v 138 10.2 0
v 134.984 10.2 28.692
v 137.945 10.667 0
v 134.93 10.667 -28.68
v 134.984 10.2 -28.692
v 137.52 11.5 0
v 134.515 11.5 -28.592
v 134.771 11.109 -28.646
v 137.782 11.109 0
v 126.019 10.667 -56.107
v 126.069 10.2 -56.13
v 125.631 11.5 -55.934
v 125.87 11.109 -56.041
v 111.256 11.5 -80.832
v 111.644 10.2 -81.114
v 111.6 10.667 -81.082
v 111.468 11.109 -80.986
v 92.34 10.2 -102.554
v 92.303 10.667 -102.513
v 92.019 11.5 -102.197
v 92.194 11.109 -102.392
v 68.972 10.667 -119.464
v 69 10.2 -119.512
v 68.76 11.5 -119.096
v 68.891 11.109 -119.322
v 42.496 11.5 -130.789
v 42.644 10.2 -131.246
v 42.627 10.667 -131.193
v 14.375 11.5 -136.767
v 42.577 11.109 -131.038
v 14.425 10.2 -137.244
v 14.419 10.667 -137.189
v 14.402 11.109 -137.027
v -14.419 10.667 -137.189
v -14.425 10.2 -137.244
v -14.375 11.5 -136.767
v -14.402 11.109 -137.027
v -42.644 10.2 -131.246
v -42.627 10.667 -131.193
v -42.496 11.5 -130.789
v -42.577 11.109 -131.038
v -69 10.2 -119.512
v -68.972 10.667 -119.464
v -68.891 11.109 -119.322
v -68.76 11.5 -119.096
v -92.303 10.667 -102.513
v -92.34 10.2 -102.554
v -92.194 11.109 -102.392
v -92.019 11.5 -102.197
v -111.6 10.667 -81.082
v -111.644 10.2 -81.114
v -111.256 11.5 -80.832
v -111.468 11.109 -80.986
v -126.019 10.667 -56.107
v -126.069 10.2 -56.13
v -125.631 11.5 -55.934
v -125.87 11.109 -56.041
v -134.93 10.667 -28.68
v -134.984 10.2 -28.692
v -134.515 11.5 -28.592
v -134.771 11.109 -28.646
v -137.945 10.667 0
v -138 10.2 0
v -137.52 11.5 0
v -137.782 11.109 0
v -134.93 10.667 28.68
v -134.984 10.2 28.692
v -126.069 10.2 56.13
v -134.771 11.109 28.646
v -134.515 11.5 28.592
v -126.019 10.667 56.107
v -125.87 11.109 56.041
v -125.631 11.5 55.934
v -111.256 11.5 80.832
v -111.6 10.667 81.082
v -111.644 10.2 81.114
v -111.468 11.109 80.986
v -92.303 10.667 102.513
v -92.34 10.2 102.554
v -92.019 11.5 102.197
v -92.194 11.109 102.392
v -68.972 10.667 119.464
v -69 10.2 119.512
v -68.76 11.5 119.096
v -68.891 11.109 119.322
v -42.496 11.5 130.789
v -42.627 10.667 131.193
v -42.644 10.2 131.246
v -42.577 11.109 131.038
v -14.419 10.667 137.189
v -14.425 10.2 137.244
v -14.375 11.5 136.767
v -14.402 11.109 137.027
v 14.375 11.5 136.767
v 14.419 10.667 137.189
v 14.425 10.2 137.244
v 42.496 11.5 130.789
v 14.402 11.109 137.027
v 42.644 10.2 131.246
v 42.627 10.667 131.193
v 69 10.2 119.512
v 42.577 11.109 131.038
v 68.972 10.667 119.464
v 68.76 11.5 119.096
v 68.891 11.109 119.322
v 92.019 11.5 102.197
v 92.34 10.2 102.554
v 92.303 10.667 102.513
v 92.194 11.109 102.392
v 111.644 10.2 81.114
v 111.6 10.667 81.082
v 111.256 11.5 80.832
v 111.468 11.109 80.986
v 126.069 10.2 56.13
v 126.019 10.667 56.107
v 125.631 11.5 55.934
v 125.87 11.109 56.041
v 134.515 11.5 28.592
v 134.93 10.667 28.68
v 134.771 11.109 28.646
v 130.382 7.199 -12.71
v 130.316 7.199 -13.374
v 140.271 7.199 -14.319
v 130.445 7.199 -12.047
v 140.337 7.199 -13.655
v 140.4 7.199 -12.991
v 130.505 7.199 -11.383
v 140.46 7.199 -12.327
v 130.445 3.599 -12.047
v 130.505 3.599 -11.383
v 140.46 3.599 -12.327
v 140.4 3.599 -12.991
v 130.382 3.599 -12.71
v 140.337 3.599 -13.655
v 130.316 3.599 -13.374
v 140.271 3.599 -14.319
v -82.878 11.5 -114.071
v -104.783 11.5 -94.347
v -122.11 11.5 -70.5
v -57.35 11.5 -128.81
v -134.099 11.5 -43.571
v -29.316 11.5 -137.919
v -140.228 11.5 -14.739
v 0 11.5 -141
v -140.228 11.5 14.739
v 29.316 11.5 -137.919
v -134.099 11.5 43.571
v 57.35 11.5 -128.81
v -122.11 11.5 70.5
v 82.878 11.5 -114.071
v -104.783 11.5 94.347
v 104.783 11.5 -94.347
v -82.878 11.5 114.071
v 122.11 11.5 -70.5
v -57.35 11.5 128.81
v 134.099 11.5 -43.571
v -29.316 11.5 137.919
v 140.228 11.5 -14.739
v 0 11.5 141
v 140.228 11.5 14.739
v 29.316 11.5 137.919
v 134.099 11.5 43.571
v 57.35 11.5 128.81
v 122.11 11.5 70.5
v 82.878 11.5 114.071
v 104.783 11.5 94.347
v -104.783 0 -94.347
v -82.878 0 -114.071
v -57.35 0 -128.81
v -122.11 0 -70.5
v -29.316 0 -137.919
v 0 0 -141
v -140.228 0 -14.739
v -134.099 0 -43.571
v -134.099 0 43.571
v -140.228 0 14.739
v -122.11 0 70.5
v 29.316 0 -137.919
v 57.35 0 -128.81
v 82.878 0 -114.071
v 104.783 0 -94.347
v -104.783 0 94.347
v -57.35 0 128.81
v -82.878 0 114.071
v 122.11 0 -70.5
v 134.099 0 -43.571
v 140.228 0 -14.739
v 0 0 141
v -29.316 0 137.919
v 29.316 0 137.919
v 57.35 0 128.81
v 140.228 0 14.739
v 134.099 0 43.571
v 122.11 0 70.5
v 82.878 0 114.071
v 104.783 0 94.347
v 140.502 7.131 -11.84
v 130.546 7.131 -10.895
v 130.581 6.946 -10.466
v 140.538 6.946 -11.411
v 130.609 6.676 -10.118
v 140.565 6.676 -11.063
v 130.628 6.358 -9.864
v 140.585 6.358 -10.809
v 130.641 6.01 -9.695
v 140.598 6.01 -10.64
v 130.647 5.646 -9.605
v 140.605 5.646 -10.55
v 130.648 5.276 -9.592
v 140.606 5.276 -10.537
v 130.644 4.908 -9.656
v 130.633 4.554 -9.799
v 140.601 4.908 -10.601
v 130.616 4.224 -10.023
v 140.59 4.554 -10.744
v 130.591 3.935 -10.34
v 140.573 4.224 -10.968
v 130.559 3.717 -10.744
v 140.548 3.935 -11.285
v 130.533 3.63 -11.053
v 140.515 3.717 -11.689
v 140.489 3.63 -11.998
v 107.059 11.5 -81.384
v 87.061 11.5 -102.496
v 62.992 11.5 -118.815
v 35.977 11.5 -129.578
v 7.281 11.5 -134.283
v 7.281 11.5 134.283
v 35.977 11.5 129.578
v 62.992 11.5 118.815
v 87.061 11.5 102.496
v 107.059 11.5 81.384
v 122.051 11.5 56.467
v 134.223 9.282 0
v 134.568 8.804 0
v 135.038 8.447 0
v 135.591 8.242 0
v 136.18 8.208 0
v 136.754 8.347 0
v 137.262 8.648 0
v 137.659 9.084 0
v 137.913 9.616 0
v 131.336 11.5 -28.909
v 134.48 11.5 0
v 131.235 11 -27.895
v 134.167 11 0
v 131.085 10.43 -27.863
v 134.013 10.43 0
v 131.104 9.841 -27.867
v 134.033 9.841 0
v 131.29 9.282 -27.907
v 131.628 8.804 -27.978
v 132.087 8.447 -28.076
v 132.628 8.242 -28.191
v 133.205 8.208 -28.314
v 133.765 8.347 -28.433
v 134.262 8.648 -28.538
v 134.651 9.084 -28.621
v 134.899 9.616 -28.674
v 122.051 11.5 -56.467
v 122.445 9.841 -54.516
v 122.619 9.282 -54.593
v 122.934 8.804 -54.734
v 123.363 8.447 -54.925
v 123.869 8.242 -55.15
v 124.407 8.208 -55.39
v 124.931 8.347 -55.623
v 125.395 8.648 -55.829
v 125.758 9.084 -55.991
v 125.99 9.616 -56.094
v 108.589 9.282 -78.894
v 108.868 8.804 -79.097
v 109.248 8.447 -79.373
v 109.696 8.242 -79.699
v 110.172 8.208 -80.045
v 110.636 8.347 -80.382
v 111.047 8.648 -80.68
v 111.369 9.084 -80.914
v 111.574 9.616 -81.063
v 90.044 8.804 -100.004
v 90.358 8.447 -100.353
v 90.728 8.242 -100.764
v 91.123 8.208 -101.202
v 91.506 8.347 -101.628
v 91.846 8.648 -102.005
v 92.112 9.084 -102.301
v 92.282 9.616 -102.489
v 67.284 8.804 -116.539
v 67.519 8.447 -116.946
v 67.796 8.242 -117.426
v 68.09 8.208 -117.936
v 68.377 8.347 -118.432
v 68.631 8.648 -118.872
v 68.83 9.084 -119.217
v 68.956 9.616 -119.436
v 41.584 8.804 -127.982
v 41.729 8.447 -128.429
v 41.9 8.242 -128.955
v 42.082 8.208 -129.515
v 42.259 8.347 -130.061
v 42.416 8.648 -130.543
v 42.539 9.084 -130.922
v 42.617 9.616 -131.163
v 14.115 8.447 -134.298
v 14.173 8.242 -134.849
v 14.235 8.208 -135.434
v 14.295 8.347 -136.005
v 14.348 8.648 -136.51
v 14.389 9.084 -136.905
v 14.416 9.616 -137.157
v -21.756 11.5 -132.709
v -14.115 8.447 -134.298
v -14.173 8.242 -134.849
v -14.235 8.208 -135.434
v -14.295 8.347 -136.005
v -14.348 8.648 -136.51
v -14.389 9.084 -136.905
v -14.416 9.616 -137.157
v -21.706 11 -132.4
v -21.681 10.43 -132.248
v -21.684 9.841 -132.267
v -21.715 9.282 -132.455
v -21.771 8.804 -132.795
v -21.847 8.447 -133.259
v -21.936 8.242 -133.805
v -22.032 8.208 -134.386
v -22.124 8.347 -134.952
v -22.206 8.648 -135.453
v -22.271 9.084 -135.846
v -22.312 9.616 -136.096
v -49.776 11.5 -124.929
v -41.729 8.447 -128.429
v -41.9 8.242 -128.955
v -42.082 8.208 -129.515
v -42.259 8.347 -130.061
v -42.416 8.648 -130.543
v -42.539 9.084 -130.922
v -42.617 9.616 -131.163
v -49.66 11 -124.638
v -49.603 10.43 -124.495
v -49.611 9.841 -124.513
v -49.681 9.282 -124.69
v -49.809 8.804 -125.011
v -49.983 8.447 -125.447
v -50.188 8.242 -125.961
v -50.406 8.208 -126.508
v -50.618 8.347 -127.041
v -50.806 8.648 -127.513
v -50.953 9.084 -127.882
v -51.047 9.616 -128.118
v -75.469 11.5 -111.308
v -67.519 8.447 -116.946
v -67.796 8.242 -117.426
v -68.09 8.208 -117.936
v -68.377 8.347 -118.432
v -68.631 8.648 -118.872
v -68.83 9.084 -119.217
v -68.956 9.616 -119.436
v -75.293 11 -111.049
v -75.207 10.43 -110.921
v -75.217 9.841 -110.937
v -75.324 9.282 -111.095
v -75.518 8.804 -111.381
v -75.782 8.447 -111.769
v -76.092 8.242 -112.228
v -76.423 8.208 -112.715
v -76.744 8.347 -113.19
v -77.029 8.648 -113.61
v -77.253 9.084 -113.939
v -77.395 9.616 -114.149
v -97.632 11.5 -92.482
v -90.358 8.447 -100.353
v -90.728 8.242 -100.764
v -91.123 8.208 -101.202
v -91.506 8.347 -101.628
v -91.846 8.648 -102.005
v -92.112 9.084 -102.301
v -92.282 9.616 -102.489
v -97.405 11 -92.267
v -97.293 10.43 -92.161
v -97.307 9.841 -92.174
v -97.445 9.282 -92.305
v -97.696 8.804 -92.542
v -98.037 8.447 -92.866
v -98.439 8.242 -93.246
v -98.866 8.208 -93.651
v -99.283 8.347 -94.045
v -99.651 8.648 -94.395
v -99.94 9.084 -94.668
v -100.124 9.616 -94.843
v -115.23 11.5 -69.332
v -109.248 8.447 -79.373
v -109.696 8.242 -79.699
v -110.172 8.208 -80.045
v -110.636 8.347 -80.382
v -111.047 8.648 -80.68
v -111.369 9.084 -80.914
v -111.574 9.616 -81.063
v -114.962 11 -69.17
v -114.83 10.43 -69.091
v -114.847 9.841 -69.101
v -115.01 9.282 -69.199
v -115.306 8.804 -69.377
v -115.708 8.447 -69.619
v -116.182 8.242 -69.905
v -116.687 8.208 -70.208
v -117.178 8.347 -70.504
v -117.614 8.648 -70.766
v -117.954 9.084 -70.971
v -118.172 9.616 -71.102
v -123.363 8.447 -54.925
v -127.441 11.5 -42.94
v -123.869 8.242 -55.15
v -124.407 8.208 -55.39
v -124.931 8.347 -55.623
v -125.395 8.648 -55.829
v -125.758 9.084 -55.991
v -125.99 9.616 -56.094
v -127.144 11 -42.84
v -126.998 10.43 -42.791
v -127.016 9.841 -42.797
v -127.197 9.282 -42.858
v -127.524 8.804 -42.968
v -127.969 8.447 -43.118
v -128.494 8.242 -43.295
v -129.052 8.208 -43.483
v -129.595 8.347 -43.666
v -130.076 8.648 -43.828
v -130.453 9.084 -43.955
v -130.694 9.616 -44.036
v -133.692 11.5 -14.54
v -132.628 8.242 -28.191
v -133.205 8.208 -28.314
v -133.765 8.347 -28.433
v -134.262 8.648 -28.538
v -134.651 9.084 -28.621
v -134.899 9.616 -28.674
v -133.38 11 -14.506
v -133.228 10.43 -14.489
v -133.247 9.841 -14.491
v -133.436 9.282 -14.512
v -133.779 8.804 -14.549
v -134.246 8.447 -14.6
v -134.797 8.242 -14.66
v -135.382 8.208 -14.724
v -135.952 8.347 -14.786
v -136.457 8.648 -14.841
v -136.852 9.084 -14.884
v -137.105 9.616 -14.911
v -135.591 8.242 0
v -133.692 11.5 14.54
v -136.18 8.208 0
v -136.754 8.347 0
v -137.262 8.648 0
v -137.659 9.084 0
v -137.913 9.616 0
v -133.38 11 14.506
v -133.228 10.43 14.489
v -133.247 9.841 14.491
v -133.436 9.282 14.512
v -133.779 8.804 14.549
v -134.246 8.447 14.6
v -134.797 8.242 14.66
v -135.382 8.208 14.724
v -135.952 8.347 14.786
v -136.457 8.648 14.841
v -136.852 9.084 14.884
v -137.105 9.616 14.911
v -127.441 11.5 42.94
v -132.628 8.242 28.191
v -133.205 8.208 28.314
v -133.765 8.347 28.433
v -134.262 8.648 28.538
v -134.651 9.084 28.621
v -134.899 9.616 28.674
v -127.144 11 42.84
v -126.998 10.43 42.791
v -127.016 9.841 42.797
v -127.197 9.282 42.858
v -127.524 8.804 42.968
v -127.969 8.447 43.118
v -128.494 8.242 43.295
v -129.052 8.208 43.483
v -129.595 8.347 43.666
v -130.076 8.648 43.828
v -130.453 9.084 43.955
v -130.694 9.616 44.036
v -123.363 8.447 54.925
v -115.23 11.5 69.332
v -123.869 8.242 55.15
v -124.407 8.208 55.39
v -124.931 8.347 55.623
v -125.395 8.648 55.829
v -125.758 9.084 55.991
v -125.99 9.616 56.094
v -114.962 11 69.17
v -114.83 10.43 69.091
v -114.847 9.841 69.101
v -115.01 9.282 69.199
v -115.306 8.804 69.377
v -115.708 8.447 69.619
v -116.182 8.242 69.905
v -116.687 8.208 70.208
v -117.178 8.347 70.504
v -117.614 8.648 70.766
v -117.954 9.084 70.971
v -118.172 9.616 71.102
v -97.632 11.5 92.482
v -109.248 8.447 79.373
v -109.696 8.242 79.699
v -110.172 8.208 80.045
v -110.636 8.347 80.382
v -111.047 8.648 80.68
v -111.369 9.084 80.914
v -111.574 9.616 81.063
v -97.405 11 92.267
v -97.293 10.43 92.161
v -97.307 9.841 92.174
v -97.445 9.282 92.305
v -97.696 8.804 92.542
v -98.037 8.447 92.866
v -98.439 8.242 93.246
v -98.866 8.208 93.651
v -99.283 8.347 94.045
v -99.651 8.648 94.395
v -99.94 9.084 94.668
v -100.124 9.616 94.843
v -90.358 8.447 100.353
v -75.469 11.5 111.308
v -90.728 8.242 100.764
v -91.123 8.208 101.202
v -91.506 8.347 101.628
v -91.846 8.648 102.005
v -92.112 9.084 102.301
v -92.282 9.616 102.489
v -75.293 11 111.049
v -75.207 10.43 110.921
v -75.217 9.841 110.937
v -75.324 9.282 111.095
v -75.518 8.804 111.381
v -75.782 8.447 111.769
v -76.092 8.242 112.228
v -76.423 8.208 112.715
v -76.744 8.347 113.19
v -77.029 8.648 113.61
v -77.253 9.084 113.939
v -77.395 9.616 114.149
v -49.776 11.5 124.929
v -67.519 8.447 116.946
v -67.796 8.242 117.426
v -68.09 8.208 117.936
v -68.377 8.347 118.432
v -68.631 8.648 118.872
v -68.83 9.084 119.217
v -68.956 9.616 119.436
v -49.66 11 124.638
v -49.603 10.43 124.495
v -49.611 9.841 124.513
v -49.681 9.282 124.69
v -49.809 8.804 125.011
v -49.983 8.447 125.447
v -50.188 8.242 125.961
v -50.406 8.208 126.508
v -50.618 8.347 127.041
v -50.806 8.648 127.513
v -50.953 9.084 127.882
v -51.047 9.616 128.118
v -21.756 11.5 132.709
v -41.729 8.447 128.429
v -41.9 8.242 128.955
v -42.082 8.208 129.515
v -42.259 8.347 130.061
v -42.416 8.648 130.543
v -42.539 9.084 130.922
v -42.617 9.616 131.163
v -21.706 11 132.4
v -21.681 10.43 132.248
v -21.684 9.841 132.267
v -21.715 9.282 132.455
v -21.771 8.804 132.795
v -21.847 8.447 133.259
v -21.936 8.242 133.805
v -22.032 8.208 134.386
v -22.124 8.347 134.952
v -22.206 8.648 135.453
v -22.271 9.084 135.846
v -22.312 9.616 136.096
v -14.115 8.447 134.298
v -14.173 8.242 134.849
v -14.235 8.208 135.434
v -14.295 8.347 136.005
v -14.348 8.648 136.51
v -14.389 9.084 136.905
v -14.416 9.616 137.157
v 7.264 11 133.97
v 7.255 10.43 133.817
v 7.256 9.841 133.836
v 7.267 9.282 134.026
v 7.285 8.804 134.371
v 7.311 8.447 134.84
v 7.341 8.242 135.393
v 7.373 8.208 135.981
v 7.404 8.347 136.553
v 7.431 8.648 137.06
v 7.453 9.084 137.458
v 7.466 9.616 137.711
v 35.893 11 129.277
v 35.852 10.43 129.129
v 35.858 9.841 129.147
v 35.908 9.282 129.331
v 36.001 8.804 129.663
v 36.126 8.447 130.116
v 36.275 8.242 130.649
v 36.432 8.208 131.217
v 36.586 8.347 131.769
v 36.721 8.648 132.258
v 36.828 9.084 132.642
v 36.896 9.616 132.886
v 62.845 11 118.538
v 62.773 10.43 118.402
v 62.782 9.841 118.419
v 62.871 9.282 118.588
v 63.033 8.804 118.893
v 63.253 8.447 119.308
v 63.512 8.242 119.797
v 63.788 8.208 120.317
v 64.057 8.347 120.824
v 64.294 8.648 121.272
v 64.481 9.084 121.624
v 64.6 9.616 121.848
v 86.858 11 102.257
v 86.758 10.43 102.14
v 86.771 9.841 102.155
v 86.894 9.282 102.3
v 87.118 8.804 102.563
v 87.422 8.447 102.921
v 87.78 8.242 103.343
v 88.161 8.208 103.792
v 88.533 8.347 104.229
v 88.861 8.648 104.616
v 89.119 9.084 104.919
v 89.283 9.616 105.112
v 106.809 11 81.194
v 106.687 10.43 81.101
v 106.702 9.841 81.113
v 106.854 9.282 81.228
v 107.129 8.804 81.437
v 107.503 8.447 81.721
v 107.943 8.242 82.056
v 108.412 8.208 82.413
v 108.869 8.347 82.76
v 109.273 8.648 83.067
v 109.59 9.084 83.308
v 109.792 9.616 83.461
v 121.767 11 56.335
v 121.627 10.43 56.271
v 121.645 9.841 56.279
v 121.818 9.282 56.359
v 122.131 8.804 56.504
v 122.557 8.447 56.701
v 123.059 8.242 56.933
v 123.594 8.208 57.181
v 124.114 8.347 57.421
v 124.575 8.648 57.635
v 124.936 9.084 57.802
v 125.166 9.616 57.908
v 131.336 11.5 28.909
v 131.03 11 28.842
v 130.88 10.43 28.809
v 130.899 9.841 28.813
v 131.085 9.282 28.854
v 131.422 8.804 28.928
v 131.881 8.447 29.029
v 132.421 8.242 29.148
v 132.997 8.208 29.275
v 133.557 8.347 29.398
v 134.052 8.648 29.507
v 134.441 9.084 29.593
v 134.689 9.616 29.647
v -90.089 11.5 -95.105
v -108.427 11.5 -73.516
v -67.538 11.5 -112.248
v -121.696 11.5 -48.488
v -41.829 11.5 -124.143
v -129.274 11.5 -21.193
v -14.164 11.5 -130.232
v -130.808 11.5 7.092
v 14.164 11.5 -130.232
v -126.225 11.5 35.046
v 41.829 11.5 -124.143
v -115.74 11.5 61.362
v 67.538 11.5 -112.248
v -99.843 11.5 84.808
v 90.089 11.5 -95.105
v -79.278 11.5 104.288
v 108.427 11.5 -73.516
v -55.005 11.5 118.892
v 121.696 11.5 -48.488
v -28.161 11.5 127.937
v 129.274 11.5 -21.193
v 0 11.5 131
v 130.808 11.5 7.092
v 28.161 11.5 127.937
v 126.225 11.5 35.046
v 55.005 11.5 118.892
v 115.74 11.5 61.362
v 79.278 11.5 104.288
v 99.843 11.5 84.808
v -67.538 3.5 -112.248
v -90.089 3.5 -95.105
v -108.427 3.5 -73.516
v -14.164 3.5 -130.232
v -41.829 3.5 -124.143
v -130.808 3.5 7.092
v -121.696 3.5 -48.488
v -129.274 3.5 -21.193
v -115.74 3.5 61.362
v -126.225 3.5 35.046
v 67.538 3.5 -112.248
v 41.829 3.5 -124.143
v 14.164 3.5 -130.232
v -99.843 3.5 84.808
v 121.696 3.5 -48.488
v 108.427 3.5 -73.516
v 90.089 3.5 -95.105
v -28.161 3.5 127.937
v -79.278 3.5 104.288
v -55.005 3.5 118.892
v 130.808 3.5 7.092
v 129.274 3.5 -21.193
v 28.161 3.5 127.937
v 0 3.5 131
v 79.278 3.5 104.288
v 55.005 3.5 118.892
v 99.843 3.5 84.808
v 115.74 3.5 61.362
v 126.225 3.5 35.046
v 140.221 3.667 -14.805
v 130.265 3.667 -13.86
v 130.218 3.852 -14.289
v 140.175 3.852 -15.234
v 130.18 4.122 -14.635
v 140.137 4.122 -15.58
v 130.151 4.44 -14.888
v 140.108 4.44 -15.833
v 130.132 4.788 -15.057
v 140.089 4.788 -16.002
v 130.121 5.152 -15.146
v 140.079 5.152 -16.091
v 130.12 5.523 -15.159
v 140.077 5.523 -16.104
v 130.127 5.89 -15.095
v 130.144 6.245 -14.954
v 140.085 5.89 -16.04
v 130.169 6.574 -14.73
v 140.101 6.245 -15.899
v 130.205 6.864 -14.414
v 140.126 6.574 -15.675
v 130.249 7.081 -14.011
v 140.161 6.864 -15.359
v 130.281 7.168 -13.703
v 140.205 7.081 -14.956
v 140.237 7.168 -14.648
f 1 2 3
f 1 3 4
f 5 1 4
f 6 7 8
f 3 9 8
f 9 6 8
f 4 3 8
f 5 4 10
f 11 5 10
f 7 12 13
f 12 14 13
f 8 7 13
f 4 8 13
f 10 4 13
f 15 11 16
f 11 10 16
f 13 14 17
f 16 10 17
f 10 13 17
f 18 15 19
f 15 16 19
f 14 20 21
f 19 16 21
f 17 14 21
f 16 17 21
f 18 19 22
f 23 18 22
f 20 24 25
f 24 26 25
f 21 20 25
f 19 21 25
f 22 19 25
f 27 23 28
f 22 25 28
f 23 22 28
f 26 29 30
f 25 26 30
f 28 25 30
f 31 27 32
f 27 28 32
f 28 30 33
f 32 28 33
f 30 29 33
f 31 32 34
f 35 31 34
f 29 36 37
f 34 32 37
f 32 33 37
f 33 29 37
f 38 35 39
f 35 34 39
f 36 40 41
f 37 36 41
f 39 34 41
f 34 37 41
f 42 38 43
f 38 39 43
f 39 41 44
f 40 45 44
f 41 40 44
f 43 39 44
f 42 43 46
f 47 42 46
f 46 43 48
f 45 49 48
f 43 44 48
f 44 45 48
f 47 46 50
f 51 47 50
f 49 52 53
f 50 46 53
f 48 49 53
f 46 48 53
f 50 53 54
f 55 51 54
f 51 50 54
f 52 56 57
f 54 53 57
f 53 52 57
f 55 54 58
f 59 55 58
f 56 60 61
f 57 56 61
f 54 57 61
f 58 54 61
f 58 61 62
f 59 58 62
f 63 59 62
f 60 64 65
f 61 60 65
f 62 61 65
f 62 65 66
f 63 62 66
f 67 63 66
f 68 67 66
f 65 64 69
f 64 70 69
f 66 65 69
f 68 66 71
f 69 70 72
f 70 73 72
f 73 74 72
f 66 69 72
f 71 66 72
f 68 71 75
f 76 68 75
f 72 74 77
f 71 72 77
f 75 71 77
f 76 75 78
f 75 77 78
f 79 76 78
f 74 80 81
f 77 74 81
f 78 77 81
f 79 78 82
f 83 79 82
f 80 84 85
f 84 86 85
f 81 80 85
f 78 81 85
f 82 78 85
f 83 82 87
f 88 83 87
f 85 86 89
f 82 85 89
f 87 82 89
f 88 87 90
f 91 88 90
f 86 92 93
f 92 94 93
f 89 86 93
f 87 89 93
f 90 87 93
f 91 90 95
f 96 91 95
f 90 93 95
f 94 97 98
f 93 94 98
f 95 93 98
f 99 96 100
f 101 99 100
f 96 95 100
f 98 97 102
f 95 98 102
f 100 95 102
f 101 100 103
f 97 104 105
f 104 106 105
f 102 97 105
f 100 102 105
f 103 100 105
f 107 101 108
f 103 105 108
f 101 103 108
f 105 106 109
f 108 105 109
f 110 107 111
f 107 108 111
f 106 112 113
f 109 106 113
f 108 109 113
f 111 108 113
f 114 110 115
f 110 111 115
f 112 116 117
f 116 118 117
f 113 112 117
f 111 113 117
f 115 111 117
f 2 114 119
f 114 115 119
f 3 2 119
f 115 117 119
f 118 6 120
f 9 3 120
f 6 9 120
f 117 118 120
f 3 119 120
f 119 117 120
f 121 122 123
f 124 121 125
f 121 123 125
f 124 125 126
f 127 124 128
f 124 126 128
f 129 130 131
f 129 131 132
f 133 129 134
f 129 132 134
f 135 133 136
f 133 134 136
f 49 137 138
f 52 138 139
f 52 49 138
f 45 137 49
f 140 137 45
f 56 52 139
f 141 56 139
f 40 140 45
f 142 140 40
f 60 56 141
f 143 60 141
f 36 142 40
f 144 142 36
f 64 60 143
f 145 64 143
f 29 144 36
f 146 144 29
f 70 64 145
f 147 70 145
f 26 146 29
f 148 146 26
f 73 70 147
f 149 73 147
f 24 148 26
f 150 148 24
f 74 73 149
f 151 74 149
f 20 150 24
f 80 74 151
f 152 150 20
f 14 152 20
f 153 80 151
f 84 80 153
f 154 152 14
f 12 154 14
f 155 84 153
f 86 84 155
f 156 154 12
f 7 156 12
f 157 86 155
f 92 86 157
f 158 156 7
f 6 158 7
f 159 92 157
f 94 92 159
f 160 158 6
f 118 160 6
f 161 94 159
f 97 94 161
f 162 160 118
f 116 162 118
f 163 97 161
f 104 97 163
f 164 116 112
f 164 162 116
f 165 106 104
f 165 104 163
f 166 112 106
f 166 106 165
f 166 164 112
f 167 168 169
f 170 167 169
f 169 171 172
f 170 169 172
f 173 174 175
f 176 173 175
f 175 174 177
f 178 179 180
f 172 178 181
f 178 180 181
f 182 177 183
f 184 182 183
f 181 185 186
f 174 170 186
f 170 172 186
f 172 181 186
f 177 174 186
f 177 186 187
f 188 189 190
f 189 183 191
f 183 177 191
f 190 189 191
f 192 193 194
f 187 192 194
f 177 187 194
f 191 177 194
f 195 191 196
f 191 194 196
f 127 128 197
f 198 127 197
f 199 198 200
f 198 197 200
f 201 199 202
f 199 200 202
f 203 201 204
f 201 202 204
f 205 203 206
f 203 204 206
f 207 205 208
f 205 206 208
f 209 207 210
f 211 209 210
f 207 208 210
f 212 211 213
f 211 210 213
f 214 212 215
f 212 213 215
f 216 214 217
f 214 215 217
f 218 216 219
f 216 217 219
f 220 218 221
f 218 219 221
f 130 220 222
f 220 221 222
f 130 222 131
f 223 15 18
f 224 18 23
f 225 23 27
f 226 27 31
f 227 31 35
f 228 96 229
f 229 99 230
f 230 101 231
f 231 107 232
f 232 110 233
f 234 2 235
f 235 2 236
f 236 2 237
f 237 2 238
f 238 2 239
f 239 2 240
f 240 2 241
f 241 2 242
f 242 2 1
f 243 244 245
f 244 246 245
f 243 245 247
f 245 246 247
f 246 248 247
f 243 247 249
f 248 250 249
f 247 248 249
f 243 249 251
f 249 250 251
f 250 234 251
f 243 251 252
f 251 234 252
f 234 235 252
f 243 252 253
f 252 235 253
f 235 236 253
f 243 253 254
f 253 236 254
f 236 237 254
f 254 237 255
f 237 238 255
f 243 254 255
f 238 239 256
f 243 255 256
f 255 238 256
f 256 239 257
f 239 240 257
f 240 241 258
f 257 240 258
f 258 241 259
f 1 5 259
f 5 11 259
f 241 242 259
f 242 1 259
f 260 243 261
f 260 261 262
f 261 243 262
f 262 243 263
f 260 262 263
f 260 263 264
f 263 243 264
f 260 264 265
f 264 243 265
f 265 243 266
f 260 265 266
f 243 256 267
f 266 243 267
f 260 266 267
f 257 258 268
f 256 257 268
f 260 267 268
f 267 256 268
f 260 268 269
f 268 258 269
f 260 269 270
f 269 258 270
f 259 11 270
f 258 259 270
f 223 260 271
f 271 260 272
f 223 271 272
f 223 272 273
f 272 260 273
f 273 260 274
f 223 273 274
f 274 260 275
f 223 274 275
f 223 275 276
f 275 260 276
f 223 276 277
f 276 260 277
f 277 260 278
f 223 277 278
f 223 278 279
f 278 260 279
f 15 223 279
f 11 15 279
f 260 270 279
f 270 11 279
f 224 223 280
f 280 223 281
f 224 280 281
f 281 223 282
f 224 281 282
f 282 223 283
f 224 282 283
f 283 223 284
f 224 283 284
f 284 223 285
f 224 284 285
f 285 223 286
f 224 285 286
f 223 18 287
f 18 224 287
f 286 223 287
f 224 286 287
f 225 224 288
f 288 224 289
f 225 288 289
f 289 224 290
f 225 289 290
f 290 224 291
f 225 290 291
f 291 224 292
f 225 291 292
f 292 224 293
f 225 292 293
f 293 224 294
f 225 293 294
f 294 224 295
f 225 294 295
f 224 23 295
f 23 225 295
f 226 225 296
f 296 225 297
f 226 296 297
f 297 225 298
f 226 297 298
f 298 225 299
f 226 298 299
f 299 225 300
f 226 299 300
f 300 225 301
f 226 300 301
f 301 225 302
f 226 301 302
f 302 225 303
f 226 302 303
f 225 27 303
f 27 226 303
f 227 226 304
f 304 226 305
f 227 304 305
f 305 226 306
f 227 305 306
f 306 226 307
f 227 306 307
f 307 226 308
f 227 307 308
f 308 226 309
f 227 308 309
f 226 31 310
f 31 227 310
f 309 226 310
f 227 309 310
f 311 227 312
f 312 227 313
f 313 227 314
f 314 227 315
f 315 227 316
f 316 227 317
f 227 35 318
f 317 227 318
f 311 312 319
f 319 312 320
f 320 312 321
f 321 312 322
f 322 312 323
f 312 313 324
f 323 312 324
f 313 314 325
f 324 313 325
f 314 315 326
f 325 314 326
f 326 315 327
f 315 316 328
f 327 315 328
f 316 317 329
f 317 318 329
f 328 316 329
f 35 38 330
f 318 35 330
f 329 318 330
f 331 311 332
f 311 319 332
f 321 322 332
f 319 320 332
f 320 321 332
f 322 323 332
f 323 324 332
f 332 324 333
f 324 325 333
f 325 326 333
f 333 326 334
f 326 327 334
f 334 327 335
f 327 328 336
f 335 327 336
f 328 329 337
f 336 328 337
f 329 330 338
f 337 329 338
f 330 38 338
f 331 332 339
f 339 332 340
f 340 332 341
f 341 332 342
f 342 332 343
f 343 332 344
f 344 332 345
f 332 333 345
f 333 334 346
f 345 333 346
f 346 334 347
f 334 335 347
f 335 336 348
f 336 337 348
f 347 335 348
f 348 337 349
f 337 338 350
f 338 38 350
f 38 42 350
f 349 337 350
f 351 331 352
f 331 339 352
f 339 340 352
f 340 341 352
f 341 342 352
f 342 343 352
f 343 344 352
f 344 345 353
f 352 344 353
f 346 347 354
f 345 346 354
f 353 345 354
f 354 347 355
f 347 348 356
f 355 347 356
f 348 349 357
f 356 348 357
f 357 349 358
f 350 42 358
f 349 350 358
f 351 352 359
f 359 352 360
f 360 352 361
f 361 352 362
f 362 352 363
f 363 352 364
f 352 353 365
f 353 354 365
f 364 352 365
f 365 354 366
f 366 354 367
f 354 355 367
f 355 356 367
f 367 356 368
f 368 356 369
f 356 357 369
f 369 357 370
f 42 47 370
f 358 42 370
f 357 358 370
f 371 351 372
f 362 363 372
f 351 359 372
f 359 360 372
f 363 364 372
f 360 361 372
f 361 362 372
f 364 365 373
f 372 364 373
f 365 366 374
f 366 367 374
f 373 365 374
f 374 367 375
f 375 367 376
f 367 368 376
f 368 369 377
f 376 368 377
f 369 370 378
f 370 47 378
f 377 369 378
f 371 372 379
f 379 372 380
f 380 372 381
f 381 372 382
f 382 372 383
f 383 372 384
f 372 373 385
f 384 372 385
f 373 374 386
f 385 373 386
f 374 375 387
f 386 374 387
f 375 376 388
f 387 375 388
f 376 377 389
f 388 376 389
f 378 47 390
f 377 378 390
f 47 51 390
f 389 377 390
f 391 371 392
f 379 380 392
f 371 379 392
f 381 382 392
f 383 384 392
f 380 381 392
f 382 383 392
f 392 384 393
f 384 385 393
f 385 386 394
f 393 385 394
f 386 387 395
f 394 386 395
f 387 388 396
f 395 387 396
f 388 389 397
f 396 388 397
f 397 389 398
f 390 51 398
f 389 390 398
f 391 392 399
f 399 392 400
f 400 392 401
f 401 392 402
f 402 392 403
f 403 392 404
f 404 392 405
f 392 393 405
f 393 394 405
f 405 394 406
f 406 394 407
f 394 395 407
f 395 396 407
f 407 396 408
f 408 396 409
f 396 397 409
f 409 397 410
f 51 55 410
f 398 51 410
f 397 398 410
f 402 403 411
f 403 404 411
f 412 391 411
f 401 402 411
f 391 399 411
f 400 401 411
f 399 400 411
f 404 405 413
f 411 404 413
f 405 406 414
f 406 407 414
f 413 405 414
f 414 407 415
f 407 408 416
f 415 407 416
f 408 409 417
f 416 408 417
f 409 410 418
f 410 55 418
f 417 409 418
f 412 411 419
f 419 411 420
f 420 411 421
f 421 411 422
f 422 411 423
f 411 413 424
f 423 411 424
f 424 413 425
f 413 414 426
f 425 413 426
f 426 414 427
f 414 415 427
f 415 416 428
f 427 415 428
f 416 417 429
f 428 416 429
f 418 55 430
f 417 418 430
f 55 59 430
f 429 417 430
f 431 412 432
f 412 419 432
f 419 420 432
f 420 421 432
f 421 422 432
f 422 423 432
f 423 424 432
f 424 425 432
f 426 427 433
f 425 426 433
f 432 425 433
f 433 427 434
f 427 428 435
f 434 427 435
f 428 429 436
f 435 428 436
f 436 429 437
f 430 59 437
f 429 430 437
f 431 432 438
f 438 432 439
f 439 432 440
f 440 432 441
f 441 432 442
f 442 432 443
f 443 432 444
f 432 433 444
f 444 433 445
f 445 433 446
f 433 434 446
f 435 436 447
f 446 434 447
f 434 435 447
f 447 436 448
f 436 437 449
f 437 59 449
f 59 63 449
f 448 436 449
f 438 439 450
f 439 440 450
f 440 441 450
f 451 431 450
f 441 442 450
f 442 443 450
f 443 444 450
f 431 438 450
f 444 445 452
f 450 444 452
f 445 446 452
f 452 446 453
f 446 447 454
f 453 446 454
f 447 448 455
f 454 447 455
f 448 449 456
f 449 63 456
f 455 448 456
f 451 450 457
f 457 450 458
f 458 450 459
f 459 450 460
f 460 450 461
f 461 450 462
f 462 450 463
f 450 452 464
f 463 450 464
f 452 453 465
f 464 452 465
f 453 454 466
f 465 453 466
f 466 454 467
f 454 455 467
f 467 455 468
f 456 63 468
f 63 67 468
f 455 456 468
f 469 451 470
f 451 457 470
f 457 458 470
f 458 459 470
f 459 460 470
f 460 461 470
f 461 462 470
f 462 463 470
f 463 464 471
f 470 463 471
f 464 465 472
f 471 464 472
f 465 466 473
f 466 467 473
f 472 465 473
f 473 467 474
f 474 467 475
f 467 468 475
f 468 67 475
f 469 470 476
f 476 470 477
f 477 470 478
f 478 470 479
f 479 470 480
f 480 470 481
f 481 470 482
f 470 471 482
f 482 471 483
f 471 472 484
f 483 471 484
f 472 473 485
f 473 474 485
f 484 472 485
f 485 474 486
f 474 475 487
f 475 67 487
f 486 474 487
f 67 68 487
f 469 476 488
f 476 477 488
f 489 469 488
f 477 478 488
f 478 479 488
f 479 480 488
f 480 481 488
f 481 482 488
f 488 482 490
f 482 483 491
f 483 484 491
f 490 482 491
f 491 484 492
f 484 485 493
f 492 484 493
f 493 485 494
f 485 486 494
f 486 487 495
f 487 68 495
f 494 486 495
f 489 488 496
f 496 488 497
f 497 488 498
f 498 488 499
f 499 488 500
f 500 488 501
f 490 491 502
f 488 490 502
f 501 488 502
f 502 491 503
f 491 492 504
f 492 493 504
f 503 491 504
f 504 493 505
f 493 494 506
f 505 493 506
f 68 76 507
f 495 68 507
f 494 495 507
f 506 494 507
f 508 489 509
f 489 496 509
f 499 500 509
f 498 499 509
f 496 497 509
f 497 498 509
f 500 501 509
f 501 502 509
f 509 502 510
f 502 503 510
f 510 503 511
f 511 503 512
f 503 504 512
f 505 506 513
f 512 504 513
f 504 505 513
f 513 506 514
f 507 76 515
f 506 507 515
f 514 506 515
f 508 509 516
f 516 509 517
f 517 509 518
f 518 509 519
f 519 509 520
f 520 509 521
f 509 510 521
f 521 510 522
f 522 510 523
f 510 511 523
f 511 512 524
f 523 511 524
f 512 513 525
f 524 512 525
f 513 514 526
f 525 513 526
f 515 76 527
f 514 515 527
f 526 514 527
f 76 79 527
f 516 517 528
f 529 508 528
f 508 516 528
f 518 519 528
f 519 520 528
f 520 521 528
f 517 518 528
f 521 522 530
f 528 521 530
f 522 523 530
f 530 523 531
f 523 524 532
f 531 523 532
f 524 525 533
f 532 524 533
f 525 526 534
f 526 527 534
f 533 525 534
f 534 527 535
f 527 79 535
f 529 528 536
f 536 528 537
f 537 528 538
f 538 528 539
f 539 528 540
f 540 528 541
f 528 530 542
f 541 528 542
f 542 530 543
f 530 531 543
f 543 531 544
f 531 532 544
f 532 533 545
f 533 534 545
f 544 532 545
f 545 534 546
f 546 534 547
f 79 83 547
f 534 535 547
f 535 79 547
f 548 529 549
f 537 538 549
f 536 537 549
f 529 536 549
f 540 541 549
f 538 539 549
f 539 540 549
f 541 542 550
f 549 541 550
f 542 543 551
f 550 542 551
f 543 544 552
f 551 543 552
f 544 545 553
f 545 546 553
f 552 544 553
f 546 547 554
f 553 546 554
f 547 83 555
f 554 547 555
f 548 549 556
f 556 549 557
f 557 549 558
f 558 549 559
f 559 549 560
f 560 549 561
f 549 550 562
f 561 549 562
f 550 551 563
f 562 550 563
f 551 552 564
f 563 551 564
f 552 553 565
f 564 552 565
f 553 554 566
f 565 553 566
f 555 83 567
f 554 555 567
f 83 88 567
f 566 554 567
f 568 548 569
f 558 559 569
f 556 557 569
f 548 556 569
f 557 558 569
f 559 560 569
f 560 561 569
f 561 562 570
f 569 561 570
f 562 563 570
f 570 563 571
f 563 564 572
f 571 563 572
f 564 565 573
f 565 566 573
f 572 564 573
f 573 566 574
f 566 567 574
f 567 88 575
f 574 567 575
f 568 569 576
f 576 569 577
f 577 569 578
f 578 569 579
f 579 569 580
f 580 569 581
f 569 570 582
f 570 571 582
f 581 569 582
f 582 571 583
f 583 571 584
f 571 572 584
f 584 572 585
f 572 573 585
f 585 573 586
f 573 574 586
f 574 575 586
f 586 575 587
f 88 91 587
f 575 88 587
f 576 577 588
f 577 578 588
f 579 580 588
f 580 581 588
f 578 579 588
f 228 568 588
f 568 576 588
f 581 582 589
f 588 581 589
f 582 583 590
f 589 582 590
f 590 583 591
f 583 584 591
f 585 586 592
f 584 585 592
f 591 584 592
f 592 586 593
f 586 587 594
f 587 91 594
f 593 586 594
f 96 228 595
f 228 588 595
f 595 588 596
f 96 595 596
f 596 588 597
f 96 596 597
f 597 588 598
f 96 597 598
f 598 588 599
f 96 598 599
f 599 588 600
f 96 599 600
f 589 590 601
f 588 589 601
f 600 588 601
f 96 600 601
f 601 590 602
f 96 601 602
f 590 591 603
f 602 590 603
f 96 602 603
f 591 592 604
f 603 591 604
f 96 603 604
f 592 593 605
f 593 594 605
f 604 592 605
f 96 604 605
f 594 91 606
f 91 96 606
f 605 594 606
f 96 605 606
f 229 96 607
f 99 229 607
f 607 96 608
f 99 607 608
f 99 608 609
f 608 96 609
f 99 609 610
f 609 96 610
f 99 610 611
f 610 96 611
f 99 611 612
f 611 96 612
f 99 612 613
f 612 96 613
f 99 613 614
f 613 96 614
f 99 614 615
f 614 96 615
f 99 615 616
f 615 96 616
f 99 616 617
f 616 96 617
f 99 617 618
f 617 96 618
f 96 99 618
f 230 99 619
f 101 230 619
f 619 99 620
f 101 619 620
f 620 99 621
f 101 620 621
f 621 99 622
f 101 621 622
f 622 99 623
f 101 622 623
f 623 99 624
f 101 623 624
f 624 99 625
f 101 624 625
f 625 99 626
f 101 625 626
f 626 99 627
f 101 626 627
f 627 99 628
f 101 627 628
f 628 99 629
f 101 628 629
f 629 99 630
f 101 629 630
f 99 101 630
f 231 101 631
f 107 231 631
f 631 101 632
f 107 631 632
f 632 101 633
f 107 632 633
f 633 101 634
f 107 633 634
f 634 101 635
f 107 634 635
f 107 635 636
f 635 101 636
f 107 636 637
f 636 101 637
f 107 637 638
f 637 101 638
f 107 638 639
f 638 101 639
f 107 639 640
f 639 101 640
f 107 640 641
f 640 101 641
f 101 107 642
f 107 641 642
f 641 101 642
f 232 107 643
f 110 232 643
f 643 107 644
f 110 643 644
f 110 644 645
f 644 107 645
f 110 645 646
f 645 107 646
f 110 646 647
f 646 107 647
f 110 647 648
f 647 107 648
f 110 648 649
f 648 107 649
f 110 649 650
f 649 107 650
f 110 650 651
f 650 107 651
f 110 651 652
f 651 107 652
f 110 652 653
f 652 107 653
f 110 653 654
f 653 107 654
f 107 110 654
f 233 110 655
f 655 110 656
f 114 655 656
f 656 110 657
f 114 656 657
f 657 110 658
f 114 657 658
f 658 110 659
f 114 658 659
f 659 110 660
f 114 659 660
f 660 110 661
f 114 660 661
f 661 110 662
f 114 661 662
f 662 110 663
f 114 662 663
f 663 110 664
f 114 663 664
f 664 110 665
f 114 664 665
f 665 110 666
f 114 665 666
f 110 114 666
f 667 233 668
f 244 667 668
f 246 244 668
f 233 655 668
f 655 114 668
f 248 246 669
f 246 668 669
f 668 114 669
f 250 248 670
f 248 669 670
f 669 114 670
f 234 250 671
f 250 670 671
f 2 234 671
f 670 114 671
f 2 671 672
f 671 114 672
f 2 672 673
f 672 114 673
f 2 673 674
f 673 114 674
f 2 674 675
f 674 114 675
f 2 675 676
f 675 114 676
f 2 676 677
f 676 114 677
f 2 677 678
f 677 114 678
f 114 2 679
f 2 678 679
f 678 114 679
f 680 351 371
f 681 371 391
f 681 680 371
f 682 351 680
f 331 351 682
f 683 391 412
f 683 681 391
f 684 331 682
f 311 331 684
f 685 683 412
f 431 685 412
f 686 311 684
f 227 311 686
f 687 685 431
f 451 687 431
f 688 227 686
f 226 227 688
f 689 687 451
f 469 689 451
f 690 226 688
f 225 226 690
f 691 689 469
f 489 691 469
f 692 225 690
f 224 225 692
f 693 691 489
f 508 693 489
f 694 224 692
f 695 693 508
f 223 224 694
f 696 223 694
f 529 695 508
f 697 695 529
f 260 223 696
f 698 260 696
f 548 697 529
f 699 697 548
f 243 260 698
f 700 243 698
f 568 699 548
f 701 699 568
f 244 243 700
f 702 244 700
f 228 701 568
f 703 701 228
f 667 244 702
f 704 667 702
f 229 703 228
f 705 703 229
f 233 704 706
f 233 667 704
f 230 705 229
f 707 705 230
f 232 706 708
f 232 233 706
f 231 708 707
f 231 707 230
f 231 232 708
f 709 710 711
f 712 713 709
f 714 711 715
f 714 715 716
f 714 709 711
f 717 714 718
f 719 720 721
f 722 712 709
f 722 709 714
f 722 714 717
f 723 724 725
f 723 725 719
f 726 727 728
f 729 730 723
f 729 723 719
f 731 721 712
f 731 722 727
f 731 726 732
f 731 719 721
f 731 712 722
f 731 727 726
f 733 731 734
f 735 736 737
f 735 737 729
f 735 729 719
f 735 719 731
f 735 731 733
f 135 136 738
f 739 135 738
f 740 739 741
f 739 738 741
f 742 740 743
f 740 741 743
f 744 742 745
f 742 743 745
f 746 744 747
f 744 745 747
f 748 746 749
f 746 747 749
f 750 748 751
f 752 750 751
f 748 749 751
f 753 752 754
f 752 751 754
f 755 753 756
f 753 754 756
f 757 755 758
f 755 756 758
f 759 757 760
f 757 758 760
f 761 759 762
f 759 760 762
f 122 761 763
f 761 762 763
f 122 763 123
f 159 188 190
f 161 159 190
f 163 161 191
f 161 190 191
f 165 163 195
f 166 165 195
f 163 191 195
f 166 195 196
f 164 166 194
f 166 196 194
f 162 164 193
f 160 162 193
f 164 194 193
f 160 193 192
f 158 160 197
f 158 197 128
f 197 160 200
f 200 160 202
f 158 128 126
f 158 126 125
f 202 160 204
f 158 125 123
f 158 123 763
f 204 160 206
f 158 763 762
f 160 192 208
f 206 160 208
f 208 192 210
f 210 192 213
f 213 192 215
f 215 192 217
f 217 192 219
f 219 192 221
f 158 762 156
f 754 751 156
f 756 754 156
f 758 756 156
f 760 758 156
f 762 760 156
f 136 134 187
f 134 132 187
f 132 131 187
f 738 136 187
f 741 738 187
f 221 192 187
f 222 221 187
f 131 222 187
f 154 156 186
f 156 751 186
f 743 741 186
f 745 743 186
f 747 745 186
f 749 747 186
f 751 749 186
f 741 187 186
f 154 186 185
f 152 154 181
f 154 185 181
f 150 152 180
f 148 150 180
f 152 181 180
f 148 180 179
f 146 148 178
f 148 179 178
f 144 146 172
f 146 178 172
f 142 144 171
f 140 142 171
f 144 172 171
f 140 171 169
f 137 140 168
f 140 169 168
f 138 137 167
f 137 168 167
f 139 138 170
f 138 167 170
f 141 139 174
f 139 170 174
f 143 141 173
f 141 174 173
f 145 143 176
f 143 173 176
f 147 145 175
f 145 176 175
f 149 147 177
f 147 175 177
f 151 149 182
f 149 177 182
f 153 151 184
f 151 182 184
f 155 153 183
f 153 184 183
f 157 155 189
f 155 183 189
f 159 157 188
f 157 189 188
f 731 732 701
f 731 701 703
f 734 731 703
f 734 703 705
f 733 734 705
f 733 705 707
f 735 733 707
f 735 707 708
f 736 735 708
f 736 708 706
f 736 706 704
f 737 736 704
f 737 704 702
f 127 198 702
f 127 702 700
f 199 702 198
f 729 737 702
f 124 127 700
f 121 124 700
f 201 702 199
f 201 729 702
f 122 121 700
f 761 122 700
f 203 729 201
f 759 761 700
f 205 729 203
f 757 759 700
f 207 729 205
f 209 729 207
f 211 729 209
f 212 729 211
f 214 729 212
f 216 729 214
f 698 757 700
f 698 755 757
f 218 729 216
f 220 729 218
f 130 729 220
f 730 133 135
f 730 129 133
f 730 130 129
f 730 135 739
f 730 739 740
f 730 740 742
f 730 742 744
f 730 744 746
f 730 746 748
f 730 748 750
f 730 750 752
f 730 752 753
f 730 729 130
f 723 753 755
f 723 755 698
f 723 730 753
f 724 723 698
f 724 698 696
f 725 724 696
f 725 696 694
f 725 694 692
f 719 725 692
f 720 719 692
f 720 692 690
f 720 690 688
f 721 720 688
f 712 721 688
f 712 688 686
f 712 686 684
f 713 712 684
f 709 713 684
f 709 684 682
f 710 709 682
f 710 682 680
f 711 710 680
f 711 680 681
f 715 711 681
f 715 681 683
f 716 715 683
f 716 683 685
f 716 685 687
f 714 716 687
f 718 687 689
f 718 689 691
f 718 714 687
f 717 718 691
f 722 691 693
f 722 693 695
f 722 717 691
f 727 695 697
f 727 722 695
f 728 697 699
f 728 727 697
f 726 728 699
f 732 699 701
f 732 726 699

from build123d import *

# Parameters (mm, degrees)
SKETCH1_R               = 141
BOSS_EXTRUDE1_DEPTH     = 3.5
SKETCH2_R               = 141
SKETCH2_R_2             = 131
BOSS_EXTRUDE2_DEPTH     = 8
SKETCH5_R               = 2
CUT_EXTRUDE3_DEPTH      = 5
CUT_EXTRUDE3_DEPTH_BACK = 15


with BuildPart() as part:
    # Sketch1 → Boss-Extrude1 (new body)
    with BuildSketch(Plane(origin=(0, 0, 0), x_dir=(1, 0, 0), z_dir=(0, 1, 0))):
        with Locations(Location((0, 0, 0), (0, 0, 270))):
            Circle(SKETCH1_R)
    extrude(amount=BOSS_EXTRUDE1_DEPTH)

    # Sketch2 → Boss-Extrude2 (add)
    with BuildSketch(Plane(origin=(0, 3.5, 0), x_dir=(1, 0, 0), z_dir=(0, 1, 0))):
        with Locations(Location((0, 0, 0), (0, 0, 270))):
            Circle(SKETCH2_R)
        with Locations(Location((0, 0, 0), (0, 0, 270))):
            Circle(SKETCH2_R_2, mode=Mode.SUBTRACT)
    extrude(amount=BOSS_EXTRUDE2_DEPTH)

    # Cut-Sweep1: sweep along a path in Sketch3
    with BuildLine(Plane(origin=(0, 11.5, 0), x_dir=(1, 0, 0), z_dir=(0, 1, 0))) as cut_sweep1_path:
        CenterArc((0, 0), 136, 0, 360)
    # Sketch5 → Cut-Sweep1 (sweep, cut)
    with BuildSketch(Plane(origin=(0, 0, 0), x_dir=(0.9955256364380607, 0, -0.09449183665584275), z_dir=(0.09449183665584275, 0, 0.9955256364380607))):
        with Locations((136, 10.2)):
            Circle(SKETCH5_R)
    sweep(path=cut_sweep1_path.line, mode=Mode.SUBTRACT)

    # Sketch6 → Cut-Extrude3 (cut, two sides: drawn at the far end of the back side and taken through both)
    with BuildSketch(Plane(origin=(130.413858373, 0, -12.378430602), x_dir=(0.09449183665584276, 0, 0.9955256364380607), z_dir=(-0.9955256364380607, 0, 0.09449183665584276)).offset(-CUT_EXTRUDE3_DEPTH_BACK)):
        with BuildLine():
            Line((1, 3.599112528), (-1, 3.599112528))
            ThreePointArc((-1, 3.599112528), (-2.8, 5.399112528), (-1, 7.199112528))
            Line((-1, 7.199112528), (1, 7.199112528))
            ThreePointArc((1, 7.199112528), (2.8, 5.399112528), (1, 3.599112528))
        make_face()
    extrude(amount=CUT_EXTRUDE3_DEPTH + CUT_EXTRUDE3_DEPTH_BACK, mode=Mode.SUBTRACT)


solid = part.part
